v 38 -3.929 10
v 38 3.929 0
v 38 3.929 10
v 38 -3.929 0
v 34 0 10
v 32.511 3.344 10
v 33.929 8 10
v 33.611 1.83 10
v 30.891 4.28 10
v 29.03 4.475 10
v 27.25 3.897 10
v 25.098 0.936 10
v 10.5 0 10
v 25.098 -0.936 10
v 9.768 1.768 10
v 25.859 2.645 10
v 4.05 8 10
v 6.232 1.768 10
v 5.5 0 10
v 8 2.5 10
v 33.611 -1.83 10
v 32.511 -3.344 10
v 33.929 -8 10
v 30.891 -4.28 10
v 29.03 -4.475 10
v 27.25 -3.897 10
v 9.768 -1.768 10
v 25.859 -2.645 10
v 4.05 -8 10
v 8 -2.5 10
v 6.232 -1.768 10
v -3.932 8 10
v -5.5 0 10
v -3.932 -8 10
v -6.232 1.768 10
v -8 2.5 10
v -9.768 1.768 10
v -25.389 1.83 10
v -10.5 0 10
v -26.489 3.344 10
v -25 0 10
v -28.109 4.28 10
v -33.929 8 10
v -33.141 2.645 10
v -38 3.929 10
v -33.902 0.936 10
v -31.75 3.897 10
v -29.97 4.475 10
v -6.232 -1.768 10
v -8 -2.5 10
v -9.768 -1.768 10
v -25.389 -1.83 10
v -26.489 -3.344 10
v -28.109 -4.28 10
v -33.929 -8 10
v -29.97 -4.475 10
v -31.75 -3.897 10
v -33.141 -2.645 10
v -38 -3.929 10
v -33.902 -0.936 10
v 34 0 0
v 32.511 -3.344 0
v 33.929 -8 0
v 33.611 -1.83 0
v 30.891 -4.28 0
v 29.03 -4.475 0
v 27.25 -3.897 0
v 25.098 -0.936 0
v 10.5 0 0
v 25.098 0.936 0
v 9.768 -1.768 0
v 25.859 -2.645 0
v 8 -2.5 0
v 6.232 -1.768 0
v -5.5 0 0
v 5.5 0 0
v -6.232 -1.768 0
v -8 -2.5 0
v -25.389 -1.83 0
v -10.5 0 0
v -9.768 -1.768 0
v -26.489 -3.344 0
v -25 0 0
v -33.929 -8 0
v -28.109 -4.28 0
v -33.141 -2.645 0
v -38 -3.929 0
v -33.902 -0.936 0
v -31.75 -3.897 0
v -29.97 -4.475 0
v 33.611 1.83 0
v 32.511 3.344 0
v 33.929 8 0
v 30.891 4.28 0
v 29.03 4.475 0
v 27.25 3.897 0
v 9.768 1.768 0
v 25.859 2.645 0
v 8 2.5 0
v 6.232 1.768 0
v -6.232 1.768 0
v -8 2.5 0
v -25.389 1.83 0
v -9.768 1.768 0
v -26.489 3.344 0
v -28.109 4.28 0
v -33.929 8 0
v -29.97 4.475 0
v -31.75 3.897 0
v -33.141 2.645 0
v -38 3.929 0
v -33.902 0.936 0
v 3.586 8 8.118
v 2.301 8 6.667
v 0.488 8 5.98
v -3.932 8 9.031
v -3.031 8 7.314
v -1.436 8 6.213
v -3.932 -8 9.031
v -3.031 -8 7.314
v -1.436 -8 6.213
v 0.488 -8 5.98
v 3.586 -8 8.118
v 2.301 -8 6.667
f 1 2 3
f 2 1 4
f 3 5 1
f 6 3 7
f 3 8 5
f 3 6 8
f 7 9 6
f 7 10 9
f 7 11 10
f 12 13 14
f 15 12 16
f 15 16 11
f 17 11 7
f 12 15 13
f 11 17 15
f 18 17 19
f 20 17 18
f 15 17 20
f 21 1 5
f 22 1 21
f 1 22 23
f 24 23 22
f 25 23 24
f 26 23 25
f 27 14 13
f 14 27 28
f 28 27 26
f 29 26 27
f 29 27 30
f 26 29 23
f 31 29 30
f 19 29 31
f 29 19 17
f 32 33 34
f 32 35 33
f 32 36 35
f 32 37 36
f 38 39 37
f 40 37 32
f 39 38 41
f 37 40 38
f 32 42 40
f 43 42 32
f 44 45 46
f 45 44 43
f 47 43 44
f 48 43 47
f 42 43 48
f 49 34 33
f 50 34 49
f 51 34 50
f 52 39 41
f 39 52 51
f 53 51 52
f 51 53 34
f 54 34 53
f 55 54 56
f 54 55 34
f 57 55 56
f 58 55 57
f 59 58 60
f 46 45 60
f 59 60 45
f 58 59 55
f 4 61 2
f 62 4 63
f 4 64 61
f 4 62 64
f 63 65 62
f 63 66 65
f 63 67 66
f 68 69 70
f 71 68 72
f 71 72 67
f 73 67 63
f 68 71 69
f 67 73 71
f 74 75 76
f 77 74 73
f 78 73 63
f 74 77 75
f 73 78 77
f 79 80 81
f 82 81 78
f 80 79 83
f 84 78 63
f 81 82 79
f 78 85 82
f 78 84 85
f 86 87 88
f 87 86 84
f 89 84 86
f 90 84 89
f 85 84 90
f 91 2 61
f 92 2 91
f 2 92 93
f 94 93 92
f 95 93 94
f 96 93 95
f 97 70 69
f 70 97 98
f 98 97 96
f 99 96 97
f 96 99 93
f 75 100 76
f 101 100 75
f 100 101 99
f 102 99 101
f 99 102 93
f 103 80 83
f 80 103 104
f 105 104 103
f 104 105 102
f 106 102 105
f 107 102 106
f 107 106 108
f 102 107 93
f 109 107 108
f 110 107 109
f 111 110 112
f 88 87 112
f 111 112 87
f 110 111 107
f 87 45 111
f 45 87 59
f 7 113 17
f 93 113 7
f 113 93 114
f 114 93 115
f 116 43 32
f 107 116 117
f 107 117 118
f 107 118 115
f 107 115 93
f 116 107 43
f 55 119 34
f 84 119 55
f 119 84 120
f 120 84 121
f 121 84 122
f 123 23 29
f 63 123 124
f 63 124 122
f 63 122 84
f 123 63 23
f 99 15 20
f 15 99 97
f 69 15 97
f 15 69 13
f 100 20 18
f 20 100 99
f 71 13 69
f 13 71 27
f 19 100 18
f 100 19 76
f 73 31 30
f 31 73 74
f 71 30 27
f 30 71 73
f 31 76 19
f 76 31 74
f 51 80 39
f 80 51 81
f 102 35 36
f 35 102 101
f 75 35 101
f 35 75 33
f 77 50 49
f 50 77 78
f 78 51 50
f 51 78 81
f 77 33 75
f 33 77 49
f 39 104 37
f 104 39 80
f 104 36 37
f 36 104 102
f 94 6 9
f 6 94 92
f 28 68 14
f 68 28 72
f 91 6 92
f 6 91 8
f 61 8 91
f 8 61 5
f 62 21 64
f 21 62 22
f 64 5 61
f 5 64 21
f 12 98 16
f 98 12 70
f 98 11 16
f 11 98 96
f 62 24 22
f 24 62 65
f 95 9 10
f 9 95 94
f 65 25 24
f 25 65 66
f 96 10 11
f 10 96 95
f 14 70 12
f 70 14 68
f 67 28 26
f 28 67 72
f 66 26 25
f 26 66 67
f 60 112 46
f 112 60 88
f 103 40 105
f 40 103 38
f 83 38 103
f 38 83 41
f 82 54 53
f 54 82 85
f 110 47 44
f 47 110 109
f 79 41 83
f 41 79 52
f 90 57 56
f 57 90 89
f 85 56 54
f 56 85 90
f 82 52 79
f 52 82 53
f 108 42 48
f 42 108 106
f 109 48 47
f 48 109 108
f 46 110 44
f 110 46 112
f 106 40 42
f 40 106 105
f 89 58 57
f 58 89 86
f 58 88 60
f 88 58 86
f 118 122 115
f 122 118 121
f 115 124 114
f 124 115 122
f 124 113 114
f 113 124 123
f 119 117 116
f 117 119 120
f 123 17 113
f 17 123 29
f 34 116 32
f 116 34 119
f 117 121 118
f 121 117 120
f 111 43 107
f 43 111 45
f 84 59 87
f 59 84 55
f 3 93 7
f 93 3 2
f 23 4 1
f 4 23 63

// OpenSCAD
// 
/*
 *  Z Bar Top Clamp
 *  by Timothy Schmidt.
 *
 *  This program is free software; you can redistribute it and/or modify
 *  it under the terms of the GNU General Public License as published by
 *  the Free Software Foundation; either version 2 of the License, or
 *  (at your option) any later version.
 *
 *  This program is distributed in the hope that it will be useful,
 *  but WITHOUT ANY WARRANTY; without even the implied warranty of
 *  MERCHANTABILITY or FITNESS FOR A PARTICULAR PURPOSE.  See the
 *  GNU General Public License for more details.
 *
 *  You should have received a copy of the GNU General Public License
 *  along with this program; if not, write to the Free Software
 *  Foundation, Inc., 59 Temple Place, Suite 330, Boston, MA  02111-1307  USA
 *
*/

//Corner cuts added by Tonokip

//<tonokip.inc>

module yhole(diameter) rotate(a=90,v=[1,0,0]) zhole(diameter); 
module zhole(diameter) cylinder(h=200,r=(diameter/2),center=true);

vM8=9;
vM4=5;

hM8=8.1;

width=16;
length=76;
height=10;

translate([0,0,height/2]) //Reposition Z
difference ()
{
	//Main Block
	cube(size=[length,width,height],center=true);

	//M4
	translate(v=[8,0,0]) zhole(vM4);
	translate(v=[-8,0,0]) zhole(vM4);

	//M8
	translate(v=[29.5,0,0]) zhole(vM8);
	translate(v=[-29.5,0,0]) zhole(vM8);

	//Clamped Hole
	translate([0,0,height/2]) yhole(hM8);

	//Corner cuts
	translate([-length/2, 11,0]) rotate(45, [0,0,1]) cube([10,10,100],center=true);
	translate([-length/2,-11,0]) rotate(45, [0,0,1]) cube([10,10,100],center=true);
	translate([ length/2, 11,0]) rotate(45, [0,0,1]) cube([10,10,100],center=true);
	translate([ length/2,-11,0]) rotate(45, [0,0,1]) cube([10,10,100],center=true);
}
